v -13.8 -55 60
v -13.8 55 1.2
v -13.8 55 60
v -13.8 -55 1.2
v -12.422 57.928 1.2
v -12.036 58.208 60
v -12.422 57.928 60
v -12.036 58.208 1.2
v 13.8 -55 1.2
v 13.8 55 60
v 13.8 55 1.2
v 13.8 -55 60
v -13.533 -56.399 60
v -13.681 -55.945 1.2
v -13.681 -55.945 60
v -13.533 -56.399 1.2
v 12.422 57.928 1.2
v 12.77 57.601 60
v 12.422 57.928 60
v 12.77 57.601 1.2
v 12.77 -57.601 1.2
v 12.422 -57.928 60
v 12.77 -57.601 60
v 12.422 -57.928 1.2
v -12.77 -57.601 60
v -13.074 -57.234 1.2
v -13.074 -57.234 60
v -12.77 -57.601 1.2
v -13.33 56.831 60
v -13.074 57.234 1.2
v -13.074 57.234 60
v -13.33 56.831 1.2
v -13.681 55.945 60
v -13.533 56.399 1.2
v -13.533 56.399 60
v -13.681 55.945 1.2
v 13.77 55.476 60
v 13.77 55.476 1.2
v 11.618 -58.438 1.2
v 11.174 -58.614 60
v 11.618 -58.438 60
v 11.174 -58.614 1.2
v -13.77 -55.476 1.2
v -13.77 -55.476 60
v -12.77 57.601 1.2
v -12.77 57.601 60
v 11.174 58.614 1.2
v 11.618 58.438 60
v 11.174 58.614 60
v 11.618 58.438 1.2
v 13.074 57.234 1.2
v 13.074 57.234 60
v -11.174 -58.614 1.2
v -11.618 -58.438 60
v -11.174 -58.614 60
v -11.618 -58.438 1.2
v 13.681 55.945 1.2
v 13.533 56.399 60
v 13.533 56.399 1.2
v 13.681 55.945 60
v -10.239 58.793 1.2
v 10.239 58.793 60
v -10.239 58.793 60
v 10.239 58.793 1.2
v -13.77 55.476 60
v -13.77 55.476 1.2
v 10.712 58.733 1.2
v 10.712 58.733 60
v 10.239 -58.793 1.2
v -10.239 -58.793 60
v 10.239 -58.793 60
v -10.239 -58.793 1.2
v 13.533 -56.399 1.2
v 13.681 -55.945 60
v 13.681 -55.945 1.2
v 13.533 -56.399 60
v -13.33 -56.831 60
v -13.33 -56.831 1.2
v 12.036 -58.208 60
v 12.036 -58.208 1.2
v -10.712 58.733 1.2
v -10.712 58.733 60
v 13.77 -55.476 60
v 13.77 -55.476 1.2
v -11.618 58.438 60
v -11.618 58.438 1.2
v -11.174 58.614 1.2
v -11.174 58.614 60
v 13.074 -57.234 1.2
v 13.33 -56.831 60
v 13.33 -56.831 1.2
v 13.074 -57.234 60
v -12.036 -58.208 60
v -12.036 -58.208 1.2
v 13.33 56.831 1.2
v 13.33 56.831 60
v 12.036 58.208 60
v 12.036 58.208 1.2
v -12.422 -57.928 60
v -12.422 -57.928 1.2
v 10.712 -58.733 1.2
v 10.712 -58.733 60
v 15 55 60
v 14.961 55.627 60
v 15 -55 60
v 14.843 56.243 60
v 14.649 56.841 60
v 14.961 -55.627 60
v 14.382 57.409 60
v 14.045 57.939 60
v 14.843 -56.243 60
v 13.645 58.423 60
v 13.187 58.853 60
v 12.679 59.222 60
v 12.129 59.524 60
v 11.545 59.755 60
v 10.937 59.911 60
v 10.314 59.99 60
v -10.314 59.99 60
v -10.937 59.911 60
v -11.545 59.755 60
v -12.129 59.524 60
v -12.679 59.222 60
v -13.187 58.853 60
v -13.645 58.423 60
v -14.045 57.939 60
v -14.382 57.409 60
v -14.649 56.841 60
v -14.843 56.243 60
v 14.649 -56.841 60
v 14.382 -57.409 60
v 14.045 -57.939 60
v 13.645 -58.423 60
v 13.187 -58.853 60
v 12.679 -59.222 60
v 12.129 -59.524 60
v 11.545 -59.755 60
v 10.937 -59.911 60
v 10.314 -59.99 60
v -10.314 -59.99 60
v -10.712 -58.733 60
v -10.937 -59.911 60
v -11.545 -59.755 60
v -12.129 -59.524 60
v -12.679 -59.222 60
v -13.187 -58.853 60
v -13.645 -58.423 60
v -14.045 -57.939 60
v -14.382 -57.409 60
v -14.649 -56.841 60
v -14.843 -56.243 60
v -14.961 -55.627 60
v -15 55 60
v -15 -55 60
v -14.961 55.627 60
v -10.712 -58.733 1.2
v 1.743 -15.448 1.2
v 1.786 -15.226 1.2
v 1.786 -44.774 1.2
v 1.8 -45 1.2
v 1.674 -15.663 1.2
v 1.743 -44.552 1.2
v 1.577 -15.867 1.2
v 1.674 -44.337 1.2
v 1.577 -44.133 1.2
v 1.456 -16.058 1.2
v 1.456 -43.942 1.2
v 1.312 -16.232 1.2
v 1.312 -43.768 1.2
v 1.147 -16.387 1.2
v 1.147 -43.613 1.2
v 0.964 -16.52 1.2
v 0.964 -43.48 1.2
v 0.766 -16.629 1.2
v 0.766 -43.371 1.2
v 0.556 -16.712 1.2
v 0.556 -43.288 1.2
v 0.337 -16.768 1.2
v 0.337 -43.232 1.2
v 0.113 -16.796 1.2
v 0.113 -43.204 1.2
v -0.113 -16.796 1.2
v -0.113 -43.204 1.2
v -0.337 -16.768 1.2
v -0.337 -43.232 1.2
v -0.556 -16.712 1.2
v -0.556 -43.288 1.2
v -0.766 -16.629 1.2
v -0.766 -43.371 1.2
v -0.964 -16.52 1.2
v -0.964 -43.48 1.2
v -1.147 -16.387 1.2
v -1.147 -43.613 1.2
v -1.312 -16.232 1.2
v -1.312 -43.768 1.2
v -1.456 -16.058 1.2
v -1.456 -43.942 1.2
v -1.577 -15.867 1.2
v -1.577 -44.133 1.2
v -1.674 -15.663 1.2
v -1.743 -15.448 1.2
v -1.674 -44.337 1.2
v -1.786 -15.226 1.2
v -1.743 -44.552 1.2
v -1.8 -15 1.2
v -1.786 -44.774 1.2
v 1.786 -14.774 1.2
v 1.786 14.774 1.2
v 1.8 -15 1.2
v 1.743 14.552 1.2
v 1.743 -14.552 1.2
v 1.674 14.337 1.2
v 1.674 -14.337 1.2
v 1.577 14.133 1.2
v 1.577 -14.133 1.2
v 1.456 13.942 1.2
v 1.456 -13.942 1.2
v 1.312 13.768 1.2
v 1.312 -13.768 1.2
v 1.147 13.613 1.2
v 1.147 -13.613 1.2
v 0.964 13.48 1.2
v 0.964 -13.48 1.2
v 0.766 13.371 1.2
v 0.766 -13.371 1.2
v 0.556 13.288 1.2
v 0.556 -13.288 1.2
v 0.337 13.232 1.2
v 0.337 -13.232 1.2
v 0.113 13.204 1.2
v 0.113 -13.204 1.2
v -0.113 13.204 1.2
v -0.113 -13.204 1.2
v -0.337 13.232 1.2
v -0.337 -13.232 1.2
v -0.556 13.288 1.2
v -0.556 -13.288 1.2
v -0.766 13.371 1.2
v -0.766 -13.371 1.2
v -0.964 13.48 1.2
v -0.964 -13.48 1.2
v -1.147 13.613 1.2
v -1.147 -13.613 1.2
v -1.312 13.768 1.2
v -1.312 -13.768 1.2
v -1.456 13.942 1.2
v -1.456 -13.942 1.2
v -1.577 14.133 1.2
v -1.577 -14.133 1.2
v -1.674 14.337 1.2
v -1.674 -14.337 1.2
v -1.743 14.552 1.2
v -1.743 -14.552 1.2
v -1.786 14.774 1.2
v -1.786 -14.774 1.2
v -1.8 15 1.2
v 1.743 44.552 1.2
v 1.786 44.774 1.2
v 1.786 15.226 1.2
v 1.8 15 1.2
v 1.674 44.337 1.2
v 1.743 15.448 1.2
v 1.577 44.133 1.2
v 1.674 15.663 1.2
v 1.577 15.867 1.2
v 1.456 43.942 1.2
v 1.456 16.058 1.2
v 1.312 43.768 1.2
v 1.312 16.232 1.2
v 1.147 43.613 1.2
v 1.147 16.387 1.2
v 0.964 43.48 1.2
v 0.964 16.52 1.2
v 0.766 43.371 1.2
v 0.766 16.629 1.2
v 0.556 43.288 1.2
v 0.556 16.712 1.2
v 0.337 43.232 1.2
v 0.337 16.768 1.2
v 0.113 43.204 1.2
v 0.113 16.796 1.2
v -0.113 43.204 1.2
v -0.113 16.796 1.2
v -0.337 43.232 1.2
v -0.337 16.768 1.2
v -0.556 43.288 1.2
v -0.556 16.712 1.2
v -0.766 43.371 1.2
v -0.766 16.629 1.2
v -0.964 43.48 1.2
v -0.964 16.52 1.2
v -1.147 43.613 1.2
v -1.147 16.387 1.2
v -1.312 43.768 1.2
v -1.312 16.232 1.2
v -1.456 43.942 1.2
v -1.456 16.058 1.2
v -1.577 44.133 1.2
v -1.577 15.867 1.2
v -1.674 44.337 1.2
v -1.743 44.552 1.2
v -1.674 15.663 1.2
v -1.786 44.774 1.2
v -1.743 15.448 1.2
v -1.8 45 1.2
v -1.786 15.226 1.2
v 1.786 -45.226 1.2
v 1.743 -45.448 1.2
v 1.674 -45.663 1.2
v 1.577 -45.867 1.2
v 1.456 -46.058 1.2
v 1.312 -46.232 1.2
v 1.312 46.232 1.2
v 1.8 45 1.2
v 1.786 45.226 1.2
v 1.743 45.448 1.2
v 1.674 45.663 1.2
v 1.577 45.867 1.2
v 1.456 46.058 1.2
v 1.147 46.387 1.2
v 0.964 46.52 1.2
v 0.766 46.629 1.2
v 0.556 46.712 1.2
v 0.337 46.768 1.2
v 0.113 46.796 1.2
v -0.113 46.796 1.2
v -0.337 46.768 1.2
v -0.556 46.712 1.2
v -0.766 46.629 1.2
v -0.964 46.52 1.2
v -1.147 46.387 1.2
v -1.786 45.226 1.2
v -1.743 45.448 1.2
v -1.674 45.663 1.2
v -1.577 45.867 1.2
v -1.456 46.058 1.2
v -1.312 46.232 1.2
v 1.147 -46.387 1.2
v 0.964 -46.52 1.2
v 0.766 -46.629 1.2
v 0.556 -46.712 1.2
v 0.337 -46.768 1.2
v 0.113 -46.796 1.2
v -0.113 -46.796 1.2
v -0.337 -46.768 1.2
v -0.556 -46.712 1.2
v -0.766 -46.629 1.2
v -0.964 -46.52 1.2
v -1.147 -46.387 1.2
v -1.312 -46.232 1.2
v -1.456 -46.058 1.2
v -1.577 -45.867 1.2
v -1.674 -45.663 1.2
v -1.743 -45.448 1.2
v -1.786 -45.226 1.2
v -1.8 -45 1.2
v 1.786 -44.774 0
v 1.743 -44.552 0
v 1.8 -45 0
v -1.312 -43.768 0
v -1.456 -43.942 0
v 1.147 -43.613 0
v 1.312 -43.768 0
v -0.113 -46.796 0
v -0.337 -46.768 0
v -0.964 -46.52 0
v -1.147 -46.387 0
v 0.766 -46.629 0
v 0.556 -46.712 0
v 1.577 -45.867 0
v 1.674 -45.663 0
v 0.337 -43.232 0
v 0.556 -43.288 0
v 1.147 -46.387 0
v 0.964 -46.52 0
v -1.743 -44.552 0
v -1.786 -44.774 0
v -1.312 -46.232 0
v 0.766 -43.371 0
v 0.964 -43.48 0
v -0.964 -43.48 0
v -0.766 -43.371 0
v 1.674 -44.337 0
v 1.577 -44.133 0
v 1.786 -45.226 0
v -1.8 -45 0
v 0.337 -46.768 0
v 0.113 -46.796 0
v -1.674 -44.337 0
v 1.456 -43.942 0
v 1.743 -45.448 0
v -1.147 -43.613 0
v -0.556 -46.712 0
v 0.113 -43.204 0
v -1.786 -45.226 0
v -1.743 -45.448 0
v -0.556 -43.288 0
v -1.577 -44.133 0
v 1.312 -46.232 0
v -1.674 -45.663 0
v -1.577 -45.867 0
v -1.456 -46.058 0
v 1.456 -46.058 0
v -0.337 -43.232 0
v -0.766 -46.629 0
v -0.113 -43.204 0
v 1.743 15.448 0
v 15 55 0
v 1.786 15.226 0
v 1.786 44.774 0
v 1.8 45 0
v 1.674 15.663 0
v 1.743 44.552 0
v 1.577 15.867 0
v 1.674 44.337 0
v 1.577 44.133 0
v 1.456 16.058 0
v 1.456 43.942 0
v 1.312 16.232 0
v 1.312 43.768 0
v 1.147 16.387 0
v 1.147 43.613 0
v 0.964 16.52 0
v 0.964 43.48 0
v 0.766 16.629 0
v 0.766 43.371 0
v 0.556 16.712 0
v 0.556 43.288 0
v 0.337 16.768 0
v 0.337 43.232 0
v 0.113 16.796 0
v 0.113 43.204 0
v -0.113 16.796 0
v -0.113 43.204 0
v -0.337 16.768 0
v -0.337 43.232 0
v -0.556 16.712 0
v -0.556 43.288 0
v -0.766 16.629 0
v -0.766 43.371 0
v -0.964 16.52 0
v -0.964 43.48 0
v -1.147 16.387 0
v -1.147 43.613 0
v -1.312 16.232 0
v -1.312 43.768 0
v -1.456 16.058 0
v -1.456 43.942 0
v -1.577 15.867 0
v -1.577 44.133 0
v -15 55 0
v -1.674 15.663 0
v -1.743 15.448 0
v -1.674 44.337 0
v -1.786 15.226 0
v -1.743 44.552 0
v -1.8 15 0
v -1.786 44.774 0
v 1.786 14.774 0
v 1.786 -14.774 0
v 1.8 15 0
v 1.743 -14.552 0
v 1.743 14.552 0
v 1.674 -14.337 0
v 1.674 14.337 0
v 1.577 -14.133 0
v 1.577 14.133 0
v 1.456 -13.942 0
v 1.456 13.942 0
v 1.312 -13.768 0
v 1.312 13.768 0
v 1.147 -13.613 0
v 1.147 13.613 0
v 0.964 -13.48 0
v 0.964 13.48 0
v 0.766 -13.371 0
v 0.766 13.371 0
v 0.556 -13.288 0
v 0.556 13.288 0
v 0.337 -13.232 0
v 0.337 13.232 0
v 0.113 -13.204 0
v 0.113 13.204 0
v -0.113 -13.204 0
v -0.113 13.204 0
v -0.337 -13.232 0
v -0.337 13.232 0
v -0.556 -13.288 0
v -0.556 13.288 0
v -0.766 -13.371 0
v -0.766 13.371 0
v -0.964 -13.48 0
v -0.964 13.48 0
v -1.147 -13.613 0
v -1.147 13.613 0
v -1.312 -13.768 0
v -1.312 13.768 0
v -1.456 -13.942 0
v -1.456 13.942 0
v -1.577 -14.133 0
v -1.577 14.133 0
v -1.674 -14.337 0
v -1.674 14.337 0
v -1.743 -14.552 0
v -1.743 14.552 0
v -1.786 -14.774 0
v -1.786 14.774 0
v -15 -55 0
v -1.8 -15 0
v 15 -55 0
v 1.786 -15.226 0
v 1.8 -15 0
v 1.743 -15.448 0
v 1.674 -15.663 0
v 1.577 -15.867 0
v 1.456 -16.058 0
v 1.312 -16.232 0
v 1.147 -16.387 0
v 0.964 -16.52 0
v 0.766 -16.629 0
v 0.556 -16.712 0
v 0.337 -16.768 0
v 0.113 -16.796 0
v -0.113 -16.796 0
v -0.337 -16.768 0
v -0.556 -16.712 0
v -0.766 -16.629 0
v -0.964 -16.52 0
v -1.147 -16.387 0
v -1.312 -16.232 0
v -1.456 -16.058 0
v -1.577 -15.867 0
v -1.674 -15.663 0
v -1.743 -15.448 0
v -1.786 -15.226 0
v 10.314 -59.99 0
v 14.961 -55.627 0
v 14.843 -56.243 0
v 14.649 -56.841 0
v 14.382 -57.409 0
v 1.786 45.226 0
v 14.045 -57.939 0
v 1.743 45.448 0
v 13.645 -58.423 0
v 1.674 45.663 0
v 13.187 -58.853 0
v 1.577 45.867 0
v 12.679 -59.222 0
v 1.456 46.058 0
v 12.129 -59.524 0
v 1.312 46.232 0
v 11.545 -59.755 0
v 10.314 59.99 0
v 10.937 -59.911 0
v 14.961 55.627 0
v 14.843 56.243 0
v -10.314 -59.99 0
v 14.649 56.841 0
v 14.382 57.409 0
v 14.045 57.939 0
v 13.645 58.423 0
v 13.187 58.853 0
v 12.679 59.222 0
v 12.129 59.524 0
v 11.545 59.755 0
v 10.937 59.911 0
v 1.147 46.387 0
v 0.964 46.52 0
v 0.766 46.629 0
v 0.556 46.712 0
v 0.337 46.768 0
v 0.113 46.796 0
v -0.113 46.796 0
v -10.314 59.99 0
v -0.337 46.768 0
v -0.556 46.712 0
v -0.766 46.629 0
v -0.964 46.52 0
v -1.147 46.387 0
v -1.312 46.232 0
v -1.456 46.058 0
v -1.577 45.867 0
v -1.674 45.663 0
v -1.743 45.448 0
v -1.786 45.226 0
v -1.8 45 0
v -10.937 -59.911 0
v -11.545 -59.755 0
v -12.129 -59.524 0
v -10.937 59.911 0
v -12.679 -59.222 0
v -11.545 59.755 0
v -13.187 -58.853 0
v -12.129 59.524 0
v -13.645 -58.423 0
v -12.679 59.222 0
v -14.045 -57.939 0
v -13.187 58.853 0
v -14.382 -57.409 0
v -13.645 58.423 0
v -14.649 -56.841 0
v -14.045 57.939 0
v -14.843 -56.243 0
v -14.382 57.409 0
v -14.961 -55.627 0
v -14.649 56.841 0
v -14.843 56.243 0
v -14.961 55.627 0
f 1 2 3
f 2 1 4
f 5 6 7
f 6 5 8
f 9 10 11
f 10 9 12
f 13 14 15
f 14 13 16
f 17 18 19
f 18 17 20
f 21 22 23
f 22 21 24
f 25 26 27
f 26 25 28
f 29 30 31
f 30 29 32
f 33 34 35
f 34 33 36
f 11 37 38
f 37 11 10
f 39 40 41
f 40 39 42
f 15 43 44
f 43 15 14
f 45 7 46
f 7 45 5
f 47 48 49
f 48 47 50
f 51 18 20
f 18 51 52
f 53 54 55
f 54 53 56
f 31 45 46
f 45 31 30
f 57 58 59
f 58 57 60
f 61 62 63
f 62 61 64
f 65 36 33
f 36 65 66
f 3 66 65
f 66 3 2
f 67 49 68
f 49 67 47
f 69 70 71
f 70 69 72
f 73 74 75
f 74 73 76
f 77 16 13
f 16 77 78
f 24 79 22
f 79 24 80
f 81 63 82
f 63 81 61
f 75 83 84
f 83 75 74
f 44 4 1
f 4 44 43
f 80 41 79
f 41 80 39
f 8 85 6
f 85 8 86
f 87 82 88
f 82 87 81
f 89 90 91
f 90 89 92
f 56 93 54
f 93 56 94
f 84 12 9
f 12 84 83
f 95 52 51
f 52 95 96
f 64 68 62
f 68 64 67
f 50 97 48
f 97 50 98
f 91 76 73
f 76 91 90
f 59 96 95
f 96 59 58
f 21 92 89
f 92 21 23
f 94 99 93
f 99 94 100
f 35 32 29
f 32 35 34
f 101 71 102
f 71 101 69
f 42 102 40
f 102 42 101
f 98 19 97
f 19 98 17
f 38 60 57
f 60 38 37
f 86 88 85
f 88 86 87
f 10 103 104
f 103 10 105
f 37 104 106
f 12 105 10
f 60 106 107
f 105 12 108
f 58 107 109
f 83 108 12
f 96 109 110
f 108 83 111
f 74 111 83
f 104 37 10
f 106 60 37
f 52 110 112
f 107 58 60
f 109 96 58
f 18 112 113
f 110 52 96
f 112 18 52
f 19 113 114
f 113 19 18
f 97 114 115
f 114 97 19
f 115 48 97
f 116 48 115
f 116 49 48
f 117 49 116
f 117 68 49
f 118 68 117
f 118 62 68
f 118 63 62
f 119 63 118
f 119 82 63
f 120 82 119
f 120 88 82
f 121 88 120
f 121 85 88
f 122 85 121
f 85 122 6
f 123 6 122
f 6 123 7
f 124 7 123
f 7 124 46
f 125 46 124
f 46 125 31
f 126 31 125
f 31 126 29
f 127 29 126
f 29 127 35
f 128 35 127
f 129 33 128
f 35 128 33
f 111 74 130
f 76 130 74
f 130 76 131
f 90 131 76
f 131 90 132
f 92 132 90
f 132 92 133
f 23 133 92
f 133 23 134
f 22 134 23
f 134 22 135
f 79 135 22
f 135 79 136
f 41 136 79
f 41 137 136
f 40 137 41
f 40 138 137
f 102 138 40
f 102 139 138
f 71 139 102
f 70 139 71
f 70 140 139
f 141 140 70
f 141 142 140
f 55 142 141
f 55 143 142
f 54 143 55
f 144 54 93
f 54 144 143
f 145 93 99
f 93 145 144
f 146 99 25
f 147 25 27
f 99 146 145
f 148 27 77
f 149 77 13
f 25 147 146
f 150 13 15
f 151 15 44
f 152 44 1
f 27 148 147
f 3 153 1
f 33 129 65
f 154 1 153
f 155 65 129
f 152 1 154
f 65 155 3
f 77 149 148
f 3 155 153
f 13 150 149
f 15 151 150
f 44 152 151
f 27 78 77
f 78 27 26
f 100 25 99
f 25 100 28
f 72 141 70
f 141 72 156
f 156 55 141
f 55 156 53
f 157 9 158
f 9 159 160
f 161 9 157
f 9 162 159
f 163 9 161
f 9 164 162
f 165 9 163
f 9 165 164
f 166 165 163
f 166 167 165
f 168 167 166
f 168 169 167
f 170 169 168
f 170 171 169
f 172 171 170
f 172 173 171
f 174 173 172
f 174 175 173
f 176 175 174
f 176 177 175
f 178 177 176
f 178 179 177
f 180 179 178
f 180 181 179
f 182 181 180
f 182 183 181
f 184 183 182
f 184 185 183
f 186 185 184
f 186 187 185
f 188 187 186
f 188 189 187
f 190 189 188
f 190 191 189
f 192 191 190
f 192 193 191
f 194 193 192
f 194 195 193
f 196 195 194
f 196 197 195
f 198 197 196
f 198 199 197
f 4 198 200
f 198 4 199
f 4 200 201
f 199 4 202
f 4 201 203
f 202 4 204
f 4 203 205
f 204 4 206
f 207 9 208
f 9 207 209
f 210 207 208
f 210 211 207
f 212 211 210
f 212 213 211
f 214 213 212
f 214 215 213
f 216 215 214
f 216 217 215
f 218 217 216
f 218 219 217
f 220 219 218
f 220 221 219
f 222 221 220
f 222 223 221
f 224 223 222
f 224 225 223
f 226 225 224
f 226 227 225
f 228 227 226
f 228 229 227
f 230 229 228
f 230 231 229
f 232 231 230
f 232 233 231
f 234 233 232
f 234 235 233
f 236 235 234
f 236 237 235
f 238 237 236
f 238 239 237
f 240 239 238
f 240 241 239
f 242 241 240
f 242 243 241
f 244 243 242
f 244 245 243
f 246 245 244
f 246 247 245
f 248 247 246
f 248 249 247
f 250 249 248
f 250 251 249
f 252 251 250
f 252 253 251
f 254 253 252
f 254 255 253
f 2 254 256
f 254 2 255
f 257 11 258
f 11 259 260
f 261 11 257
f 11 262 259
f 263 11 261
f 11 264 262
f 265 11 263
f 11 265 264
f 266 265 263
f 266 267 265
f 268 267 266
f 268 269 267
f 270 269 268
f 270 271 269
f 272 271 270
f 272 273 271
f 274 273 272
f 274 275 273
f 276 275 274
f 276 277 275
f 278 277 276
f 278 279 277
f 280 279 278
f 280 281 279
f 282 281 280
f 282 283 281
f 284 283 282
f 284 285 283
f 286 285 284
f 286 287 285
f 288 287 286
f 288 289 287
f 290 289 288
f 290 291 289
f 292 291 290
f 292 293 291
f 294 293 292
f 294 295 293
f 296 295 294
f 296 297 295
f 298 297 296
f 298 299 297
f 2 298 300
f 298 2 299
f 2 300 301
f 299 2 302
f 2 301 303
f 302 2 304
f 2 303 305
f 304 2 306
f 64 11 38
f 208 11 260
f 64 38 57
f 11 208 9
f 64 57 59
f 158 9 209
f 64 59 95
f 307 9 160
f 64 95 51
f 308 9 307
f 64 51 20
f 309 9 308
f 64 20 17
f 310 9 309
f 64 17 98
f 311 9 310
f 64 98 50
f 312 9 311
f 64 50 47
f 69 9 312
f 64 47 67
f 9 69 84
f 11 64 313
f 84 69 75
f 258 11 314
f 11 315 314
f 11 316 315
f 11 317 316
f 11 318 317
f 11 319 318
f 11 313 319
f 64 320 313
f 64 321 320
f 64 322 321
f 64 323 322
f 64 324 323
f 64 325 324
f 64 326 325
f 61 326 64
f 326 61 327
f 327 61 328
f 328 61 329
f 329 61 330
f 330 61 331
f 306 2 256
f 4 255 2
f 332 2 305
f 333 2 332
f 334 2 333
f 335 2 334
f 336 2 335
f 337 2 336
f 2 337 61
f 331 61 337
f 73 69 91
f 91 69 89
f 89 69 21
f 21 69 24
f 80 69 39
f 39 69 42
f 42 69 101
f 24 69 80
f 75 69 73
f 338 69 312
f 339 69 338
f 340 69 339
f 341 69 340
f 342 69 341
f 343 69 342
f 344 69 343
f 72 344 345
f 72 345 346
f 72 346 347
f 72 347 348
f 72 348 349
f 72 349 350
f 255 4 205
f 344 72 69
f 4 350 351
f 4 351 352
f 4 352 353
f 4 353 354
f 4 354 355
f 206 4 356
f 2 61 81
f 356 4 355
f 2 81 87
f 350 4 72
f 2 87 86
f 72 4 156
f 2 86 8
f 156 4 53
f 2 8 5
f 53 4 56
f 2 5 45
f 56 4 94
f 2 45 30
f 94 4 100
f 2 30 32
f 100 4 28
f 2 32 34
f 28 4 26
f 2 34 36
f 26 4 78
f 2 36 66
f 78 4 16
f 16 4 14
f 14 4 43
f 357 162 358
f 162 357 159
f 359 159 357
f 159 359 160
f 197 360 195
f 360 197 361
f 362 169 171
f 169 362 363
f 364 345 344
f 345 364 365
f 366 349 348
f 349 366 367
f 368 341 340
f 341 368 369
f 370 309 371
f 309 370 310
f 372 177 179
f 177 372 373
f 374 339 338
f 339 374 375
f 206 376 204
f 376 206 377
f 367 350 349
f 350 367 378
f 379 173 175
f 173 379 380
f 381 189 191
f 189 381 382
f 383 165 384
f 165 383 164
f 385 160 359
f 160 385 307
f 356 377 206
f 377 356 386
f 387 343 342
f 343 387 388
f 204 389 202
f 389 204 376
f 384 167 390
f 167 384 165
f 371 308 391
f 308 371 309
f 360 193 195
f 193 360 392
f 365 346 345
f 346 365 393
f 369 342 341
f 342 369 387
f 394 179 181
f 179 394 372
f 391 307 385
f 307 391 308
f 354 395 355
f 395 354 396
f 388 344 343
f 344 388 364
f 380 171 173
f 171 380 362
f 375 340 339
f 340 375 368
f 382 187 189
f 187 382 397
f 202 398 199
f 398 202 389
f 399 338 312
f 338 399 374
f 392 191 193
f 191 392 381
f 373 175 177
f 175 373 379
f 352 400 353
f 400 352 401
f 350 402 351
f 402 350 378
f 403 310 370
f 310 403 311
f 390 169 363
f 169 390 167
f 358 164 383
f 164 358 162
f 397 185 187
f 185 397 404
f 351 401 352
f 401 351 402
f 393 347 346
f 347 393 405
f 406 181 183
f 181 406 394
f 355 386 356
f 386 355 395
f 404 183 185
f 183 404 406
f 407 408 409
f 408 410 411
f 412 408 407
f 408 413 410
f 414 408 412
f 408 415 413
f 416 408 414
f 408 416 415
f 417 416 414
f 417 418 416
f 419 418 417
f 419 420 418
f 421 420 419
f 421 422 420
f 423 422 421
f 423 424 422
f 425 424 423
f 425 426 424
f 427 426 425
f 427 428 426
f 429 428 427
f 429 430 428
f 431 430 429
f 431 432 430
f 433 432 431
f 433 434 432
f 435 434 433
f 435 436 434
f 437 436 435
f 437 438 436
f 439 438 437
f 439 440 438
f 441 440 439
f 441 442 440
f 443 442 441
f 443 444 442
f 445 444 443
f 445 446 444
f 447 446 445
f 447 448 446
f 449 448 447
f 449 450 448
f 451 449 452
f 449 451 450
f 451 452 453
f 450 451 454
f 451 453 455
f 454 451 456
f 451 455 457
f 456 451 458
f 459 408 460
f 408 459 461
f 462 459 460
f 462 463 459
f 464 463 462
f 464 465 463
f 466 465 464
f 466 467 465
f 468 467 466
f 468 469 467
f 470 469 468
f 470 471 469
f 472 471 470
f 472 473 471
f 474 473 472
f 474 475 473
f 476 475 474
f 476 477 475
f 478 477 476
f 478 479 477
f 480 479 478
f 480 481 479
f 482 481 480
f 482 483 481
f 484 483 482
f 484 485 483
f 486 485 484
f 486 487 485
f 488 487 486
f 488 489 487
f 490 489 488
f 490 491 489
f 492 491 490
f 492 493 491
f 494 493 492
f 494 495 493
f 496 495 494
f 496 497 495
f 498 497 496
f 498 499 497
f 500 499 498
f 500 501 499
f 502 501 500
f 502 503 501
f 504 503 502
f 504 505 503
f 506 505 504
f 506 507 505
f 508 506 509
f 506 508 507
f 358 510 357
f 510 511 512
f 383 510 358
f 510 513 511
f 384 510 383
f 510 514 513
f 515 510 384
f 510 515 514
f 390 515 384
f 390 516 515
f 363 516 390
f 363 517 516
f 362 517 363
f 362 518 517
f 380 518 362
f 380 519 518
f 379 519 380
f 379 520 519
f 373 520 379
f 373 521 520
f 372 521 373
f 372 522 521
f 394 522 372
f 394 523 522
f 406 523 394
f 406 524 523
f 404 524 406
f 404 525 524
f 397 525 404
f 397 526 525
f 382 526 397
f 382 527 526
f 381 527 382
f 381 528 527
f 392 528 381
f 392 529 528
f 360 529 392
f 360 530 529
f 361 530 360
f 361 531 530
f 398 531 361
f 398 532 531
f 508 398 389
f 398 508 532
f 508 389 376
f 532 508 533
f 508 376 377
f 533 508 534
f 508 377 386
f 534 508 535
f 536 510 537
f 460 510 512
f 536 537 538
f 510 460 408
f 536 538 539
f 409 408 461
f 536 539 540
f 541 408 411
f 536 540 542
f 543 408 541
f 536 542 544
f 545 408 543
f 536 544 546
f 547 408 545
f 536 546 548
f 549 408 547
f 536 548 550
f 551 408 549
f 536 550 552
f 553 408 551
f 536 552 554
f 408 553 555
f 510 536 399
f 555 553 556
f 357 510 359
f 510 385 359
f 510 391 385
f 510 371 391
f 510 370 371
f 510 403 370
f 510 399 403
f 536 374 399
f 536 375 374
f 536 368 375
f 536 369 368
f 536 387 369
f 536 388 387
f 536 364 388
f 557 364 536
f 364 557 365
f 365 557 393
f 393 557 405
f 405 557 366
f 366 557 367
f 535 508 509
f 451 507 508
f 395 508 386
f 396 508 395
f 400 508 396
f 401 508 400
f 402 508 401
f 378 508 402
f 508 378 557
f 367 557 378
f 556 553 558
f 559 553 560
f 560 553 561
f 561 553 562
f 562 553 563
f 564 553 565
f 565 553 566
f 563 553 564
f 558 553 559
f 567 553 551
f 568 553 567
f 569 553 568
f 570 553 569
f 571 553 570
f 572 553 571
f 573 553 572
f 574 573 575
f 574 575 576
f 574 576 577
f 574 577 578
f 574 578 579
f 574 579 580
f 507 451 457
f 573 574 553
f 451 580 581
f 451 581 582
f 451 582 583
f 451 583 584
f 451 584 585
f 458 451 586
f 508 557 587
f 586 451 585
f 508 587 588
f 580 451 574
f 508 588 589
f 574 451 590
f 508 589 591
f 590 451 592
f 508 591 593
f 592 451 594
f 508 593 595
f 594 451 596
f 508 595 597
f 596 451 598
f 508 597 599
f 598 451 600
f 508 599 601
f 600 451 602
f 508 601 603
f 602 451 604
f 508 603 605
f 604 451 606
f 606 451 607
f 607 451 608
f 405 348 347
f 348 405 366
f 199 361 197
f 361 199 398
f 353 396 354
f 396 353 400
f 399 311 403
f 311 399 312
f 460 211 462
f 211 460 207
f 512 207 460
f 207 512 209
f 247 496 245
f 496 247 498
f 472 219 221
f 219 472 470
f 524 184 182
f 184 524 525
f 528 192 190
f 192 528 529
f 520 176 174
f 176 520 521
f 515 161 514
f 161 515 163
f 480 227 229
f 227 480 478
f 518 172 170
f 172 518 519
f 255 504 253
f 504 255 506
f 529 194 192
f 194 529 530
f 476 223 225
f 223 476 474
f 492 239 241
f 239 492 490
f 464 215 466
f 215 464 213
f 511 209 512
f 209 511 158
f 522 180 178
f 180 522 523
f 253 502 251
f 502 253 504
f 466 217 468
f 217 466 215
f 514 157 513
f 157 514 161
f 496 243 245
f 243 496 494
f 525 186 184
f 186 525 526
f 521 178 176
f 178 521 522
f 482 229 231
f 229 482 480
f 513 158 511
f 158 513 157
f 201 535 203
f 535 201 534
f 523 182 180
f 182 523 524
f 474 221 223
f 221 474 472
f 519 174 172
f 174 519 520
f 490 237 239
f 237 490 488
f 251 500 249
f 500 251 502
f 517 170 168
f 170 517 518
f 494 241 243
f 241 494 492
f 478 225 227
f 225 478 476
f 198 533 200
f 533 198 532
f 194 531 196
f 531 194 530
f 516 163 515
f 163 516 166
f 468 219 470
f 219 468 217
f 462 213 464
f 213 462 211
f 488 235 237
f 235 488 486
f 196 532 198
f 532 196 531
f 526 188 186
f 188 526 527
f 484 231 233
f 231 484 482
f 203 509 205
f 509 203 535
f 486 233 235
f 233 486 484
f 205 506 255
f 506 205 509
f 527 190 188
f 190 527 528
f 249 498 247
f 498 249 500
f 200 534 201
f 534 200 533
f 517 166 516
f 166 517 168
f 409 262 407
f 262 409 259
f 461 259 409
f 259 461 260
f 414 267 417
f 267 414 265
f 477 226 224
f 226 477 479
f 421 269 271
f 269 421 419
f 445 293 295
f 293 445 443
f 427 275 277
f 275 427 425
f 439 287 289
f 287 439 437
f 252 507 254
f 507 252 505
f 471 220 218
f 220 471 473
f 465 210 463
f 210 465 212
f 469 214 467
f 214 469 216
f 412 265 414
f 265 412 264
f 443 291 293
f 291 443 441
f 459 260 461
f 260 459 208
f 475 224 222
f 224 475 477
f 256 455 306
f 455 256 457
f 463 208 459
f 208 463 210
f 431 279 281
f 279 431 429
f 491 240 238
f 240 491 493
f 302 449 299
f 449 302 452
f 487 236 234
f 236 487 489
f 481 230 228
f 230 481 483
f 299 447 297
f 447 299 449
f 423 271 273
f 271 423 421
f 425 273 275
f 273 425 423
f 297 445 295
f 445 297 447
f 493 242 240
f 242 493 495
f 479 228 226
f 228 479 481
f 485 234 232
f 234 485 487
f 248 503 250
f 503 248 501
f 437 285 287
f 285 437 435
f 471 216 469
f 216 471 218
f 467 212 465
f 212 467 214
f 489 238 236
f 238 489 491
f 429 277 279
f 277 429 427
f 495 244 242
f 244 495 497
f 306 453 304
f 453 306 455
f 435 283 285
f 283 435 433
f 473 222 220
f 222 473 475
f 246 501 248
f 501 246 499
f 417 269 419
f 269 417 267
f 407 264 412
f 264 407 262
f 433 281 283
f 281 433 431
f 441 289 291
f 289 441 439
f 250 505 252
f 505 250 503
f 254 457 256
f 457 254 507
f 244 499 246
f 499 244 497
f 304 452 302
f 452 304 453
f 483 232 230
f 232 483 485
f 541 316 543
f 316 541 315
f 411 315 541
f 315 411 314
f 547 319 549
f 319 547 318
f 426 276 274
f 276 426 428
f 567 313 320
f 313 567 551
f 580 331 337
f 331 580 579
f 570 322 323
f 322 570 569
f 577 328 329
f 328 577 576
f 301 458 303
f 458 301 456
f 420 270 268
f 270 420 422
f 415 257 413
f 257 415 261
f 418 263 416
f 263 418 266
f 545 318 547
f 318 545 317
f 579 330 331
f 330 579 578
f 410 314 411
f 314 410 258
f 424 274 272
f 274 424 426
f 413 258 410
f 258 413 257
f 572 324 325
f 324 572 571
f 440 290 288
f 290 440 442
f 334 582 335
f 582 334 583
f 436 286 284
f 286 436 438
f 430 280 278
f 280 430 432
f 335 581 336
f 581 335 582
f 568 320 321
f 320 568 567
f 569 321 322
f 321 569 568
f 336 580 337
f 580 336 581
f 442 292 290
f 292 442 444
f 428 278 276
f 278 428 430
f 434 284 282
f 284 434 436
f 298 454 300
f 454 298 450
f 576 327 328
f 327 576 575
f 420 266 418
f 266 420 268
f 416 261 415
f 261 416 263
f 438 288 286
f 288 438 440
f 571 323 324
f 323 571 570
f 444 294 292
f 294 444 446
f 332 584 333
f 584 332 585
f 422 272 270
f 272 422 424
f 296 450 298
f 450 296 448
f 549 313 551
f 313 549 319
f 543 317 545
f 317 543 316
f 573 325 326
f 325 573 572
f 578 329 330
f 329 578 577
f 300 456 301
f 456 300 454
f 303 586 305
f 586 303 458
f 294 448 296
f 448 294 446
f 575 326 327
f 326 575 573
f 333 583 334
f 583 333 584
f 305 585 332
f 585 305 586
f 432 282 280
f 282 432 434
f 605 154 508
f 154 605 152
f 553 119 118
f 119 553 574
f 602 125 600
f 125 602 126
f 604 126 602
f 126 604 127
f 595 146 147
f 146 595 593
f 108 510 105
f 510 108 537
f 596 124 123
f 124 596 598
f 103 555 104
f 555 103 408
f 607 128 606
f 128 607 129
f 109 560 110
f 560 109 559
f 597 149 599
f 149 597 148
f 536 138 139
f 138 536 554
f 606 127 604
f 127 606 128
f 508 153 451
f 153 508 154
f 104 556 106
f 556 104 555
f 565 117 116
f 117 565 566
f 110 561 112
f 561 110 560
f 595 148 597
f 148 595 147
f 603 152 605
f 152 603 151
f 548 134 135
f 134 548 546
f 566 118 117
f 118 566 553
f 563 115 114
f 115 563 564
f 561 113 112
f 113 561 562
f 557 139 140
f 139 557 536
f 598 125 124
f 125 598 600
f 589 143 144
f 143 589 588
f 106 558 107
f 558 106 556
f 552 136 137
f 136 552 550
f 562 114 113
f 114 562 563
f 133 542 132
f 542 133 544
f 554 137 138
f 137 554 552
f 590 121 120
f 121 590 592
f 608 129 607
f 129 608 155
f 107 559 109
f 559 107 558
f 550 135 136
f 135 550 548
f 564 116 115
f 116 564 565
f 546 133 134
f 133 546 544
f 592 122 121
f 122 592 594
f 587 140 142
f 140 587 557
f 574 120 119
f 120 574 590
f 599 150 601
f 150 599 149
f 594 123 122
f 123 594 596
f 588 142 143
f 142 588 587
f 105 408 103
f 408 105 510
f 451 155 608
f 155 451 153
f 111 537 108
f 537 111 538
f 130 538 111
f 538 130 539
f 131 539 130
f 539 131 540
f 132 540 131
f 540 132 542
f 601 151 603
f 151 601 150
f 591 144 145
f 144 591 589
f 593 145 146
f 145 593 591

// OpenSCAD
$fn = 50;


difference() {
	union() {
		hull() {
			translate(v = [-10.0000000000, 55.0000000000, 0]) {
				cylinder(h = 60, r = 5);
			}
			translate(v = [10.0000000000, 55.0000000000, 0]) {
				cylinder(h = 60, r = 5);
			}
			translate(v = [-10.0000000000, -55.0000000000, 0]) {
				cylinder(h = 60, r = 5);
			}
			translate(v = [10.0000000000, -55.0000000000, 0]) {
				cylinder(h = 60, r = 5);
			}
		}
	}
	union() {
		translate(v = [0, 0, 1.2000000000]) {
			hull() {
				translate(v = [-10.0000000000, 55.0000000000, 0]) {
					cylinder(h = 58.8000000000, r = 3.8000000000);
				}
				translate(v = [10.0000000000, 55.0000000000, 0]) {
					cylinder(h = 58.8000000000, r = 3.8000000000);
				}
				translate(v = [-10.0000000000, -55.0000000000, 0]) {
					cylinder(h = 58.8000000000, r = 3.8000000000);
				}
				translate(v = [10.0000000000, -55.0000000000, 0]) {
					cylinder(h = 58.8000000000, r = 3.8000000000);
				}
			}
		}
		#translate(v = [0.0000000000, -45.0000000000, 0]) {
			cylinder(h = 1.2000000000, r = 1.8000000000);
		}
		#translate(v = [0.0000000000, -15.0000000000, 0]) {
			cylinder(h = 1.2000000000, r = 1.8000000000);
		}
		#translate(v = [0.0000000000, 15.0000000000, 0]) {
			cylinder(h = 1.2000000000, r = 1.8000000000);
		}
		#translate(v = [0.0000000000, 45.0000000000, 0]) {
			cylinder(h = 1.2000000000, r = 1.8000000000);
		}
	}
}
